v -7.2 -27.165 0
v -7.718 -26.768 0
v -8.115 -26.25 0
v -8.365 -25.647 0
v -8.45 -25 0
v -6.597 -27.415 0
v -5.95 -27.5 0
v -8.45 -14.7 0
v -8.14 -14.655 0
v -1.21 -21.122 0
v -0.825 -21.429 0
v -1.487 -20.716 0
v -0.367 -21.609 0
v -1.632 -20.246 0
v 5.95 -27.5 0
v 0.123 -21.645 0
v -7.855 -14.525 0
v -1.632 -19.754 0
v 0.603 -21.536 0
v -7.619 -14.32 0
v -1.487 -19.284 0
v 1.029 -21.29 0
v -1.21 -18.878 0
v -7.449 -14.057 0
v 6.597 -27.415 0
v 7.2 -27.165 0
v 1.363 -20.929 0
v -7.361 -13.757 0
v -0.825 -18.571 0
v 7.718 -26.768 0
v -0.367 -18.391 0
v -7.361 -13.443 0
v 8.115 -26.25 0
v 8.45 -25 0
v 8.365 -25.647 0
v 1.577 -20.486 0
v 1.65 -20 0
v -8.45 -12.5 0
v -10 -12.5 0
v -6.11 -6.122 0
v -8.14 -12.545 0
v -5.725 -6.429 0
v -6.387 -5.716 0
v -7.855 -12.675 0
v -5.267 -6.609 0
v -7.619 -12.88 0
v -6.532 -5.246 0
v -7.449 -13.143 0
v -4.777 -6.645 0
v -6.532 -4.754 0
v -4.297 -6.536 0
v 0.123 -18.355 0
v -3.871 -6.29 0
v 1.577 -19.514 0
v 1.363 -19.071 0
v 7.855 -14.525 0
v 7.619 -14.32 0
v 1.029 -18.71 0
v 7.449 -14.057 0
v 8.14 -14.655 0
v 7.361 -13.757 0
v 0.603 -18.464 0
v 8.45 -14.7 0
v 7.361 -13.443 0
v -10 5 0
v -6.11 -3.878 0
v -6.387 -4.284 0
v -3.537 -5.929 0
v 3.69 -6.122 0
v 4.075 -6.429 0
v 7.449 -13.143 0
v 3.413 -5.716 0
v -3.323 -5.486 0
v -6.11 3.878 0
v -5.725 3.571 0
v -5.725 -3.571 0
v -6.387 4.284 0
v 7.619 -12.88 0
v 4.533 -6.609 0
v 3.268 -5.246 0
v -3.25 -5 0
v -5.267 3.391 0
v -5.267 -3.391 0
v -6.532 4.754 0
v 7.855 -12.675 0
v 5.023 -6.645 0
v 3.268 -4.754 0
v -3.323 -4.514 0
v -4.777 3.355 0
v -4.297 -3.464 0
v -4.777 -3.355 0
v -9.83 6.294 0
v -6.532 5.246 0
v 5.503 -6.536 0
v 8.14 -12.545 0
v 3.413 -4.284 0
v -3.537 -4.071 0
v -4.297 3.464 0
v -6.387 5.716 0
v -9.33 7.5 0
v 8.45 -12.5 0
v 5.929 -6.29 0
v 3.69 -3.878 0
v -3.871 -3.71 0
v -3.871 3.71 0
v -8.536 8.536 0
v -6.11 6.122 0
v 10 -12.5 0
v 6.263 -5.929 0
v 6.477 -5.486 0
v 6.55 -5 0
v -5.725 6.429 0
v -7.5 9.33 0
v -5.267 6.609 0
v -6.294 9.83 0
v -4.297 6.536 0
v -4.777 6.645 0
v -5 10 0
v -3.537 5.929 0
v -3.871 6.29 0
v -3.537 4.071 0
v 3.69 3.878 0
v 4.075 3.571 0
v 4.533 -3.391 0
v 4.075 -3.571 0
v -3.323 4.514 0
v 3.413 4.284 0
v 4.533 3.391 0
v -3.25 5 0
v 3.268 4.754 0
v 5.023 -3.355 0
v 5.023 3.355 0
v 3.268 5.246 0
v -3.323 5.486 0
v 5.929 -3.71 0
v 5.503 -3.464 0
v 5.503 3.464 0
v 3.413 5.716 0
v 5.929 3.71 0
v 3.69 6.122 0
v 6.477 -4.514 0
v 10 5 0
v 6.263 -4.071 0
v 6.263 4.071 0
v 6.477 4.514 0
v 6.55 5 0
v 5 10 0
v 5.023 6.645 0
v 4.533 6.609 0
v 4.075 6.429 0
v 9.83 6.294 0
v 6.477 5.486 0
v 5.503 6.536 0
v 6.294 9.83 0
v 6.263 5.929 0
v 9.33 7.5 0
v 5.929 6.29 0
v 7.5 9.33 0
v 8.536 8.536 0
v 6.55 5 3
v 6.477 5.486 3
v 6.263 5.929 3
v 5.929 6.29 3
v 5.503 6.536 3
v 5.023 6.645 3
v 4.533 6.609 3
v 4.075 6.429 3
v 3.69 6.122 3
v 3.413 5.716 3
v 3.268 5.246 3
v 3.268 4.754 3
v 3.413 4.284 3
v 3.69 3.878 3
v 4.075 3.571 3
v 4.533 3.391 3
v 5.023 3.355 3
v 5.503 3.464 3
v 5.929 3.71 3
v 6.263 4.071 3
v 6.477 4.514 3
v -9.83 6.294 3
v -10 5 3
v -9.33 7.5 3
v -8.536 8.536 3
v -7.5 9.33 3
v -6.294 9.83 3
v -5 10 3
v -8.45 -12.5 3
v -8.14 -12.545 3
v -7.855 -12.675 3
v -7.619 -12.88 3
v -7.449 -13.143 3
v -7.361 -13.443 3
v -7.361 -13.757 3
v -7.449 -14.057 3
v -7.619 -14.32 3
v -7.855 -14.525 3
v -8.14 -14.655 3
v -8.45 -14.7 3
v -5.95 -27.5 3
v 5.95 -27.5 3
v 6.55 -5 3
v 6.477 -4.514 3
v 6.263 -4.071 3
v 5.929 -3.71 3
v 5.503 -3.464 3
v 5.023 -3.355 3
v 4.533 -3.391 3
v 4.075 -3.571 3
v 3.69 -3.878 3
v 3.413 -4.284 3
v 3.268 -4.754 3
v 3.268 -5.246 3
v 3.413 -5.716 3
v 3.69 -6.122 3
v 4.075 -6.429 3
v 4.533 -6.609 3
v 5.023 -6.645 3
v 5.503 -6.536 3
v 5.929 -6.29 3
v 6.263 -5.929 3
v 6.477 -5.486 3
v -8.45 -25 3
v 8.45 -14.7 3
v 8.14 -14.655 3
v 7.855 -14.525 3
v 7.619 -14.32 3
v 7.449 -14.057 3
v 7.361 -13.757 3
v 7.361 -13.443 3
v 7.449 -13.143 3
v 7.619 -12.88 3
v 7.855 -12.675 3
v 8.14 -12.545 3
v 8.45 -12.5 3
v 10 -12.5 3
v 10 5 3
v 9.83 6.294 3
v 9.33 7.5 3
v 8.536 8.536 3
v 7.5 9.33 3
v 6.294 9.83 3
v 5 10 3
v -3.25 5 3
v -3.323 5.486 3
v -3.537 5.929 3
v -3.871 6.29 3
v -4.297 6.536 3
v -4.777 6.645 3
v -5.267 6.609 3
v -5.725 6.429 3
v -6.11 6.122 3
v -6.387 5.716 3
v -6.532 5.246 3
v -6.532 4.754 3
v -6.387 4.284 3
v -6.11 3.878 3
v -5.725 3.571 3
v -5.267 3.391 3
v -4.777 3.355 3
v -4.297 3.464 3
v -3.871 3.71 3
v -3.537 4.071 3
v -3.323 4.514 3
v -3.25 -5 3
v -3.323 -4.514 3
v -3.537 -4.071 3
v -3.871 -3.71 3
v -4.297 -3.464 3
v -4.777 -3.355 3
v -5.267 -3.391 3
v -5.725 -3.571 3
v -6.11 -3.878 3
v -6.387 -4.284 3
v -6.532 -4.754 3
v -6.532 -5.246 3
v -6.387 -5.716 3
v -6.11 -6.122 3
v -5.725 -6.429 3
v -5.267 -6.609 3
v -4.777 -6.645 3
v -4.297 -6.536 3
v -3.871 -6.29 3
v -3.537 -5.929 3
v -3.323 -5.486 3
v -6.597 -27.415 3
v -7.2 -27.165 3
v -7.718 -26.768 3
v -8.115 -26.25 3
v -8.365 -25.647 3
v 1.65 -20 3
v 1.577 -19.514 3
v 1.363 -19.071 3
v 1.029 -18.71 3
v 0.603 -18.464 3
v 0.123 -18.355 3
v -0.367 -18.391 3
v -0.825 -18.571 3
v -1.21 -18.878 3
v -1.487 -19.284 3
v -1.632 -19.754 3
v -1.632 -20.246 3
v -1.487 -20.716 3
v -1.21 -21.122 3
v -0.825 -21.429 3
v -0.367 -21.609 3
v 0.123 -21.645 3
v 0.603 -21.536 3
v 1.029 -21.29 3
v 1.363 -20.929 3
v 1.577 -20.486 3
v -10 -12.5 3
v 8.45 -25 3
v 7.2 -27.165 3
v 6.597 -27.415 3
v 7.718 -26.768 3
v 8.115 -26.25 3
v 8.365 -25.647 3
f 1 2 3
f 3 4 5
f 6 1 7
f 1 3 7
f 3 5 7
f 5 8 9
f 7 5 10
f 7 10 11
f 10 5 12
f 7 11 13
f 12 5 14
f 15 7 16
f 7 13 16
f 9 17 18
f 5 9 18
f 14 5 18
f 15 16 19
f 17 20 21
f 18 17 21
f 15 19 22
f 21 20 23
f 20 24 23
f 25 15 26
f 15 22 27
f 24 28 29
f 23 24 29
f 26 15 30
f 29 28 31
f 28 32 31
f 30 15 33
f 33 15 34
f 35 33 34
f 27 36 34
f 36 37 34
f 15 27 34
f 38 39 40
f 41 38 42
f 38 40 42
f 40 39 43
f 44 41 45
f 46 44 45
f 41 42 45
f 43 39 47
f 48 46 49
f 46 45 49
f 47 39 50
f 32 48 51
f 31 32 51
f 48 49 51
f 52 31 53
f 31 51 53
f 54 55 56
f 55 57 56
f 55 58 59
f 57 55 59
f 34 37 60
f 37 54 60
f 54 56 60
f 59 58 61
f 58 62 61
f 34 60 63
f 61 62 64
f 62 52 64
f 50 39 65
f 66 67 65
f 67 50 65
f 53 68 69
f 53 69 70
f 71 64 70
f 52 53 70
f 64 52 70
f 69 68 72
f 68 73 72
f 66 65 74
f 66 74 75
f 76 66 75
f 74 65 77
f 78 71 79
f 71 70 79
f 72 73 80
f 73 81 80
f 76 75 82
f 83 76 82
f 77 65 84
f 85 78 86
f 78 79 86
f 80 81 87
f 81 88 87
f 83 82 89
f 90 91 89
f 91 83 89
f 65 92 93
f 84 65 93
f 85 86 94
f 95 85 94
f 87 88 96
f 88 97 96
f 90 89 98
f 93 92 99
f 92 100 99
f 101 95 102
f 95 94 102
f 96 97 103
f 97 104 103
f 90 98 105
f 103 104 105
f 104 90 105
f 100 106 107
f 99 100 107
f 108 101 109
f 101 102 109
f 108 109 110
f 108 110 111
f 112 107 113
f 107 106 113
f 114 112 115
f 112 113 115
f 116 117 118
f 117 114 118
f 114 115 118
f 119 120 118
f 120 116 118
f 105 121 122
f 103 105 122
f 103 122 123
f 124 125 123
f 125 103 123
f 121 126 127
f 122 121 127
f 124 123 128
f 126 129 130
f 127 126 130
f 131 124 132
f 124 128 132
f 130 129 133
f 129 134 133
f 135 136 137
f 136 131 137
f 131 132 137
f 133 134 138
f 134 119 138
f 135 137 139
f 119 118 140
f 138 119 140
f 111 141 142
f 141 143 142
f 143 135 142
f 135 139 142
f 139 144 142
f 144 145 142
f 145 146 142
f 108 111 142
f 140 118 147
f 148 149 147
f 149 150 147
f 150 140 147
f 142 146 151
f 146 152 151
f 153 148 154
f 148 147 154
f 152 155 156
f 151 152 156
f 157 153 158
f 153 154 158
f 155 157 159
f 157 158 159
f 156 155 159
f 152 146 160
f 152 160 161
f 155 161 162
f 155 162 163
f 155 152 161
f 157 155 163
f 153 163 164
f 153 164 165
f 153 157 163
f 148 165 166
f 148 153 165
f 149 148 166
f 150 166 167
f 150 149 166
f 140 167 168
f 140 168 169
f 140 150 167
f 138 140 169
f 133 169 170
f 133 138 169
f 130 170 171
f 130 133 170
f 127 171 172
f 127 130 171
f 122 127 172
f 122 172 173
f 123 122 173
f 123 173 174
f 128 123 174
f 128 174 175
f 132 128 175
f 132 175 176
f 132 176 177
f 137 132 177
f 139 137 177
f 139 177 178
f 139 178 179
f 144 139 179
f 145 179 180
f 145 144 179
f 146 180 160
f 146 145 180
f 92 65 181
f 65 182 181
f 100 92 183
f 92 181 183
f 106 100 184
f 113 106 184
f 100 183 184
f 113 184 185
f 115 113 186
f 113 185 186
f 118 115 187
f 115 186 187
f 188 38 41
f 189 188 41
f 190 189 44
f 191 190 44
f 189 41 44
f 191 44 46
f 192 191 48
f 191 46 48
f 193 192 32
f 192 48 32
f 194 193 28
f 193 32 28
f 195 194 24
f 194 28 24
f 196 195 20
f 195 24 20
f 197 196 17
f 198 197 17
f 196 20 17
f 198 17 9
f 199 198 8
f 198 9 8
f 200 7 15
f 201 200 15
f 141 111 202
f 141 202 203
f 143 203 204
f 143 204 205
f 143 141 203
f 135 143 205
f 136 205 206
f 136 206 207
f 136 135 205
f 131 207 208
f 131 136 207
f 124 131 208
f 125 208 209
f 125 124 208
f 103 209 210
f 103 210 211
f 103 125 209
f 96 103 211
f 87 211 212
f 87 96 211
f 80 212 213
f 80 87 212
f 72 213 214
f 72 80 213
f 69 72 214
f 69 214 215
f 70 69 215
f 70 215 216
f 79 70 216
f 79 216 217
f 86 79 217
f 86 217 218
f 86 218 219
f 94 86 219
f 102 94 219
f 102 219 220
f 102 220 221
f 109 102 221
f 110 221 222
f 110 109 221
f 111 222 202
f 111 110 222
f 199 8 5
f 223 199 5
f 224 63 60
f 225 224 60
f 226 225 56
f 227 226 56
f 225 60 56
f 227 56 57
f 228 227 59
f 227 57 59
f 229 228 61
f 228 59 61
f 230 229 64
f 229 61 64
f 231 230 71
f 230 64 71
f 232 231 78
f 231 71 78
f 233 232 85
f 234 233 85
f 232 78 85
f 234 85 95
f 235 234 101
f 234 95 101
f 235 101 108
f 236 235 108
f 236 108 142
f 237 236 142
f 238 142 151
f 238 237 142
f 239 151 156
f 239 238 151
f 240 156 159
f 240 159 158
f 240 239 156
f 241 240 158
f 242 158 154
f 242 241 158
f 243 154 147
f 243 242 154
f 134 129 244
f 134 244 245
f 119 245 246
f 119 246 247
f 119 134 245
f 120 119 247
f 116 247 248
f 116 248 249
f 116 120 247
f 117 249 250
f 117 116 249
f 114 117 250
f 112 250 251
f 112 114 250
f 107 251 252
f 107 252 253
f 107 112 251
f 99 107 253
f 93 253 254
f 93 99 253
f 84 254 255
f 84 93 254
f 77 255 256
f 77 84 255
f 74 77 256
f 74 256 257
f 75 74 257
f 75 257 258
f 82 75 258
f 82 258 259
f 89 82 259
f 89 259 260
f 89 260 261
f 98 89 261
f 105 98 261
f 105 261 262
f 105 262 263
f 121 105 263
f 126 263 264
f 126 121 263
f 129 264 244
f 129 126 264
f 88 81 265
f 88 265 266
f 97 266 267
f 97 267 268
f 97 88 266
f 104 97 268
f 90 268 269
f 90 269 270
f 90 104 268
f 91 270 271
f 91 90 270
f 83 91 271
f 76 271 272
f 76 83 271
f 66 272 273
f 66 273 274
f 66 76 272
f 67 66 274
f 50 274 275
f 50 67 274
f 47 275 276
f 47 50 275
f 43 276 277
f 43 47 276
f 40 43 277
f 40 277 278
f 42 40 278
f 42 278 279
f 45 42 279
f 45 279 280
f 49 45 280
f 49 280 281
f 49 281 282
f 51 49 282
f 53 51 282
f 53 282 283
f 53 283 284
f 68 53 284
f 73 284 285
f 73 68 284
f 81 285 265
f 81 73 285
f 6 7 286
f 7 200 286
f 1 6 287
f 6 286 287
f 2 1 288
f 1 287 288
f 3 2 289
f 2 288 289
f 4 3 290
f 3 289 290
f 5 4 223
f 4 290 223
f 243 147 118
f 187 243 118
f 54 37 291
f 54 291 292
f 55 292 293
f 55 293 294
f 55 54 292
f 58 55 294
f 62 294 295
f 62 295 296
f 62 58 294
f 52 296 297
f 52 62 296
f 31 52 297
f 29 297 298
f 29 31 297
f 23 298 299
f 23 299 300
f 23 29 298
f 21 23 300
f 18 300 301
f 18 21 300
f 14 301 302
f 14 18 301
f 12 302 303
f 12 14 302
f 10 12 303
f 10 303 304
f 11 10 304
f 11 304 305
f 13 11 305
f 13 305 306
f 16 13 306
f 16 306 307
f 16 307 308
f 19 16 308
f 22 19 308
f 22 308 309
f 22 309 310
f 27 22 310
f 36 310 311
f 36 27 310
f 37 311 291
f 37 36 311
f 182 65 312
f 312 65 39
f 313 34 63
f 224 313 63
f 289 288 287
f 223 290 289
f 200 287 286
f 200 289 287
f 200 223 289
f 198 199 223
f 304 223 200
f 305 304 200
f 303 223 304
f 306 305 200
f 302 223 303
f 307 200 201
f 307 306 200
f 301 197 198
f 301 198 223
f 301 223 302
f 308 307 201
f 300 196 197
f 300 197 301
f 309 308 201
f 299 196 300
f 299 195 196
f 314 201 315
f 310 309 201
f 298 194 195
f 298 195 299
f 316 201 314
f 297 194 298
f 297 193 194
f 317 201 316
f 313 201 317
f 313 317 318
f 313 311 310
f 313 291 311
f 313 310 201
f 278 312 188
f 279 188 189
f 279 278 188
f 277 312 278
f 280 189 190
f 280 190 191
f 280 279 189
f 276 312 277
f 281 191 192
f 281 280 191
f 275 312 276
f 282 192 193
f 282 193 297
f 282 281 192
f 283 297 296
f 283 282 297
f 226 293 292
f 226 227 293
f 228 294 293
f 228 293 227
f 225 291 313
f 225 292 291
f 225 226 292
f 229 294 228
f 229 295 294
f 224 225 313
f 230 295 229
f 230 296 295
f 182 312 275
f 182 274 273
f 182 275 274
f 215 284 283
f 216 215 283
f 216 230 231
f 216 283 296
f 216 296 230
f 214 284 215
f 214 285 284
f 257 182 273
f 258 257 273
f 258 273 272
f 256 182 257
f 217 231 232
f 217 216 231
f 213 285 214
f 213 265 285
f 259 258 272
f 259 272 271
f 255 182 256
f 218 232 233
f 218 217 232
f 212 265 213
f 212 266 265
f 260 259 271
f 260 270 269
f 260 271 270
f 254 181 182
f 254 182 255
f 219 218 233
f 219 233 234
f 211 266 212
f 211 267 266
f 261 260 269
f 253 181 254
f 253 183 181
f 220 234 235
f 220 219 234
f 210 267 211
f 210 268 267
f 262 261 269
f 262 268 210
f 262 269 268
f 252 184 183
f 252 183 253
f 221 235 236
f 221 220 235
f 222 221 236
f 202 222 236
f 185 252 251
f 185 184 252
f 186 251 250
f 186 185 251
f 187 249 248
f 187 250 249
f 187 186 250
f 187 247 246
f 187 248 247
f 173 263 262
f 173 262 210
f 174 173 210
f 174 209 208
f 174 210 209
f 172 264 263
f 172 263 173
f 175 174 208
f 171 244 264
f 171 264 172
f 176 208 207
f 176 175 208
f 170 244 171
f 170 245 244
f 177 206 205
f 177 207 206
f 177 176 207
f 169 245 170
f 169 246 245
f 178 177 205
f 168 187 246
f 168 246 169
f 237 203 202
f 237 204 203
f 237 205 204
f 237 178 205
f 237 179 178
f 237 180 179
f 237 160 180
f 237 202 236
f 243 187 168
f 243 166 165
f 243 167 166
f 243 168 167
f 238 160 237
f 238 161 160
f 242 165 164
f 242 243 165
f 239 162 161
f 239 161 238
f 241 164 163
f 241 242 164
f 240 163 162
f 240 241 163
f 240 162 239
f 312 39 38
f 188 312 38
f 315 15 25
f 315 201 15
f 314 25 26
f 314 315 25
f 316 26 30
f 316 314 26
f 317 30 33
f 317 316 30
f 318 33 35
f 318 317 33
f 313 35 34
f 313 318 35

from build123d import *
from OCP.BRepFilletAPI import BRepFilletAPI_MakeFillet

# Parameters (mm, degrees)
SKETCH_2_R      = 1.65
EXTRUDE_1_DEPTH = 3
FILLET_3_R1     = 2.5
FILLET_3_R2     = 5


with BuildPart() as part:
    # ｽｹｯﾁ2 → ﾎﾞｽ - 押し出し1 (new body)
    with BuildSketch(Plane.XY):
        with BuildLine():
            Line((-8.45, -27.5), (8.45, -27.5))
            Line((8.45, -27.5), (8.45, -14.7))
            ThreePointArc((8.45, -14.7), (7.35, -13.6), (8.45, -12.5))
            Line((8.45, -12.5), (10, -12.5))
            Line((10, -12.5), (10, 10))
            Line((10, 10), (-10, 10))
            Line((-10, 10), (-10, -12.5))
            Line((-10, -12.5), (-8.45, -12.5))
            ThreePointArc((-8.45, -12.5), (-7.35, -13.6), (-8.45, -14.7))
            Line((-8.45, -14.7), (-8.45, -27.5))
        make_face()
        with Locations((-4.9, 5)):
            Circle(SKETCH_2_R, mode=Mode.SUBTRACT)
        with Locations((-4.9, -5)):
            Circle(SKETCH_2_R, mode=Mode.SUBTRACT)
        with Locations((4.9, -5)):
            Circle(SKETCH_2_R, mode=Mode.SUBTRACT)
        with Locations((4.9, 5)):
            Circle(SKETCH_2_R, mode=Mode.SUBTRACT)
        with Locations((0, -20)):
            Circle(SKETCH_2_R, mode=Mode.SUBTRACT)
    extrude(amount=EXTRUDE_1_DEPTH)

    # ﾌｨﾚｯﾄ3: one fillet with a radius per group of edges: ONE call of the kernel's fillet builder (fillet() takes one radius for all edges)
    fillet_3_edges_1 = [part.edges().sort_by_distance(p)[0] for p in [
        (-8.45, -27.5, 1.5),
        (8.45, -27.5, 1.5),
    ]]
    fillet_3_edges_2 = [part.edges().sort_by_distance(p)[0] for p in [
        (10, 10, 1.5),
        (-10, 10, 1.5),
    ]]
    fillet_3 = BRepFilletAPI_MakeFillet(part.part.solid().wrapped)
    for e in fillet_3_edges_1:
        fillet_3.Add(FILLET_3_R1, e.wrapped)
    for e in fillet_3_edges_2:
        fillet_3.Add(FILLET_3_R2, e.wrapped)
    add(Compound.cast(fillet_3.Shape()), mode=Mode.REPLACE)


solid = part.part
